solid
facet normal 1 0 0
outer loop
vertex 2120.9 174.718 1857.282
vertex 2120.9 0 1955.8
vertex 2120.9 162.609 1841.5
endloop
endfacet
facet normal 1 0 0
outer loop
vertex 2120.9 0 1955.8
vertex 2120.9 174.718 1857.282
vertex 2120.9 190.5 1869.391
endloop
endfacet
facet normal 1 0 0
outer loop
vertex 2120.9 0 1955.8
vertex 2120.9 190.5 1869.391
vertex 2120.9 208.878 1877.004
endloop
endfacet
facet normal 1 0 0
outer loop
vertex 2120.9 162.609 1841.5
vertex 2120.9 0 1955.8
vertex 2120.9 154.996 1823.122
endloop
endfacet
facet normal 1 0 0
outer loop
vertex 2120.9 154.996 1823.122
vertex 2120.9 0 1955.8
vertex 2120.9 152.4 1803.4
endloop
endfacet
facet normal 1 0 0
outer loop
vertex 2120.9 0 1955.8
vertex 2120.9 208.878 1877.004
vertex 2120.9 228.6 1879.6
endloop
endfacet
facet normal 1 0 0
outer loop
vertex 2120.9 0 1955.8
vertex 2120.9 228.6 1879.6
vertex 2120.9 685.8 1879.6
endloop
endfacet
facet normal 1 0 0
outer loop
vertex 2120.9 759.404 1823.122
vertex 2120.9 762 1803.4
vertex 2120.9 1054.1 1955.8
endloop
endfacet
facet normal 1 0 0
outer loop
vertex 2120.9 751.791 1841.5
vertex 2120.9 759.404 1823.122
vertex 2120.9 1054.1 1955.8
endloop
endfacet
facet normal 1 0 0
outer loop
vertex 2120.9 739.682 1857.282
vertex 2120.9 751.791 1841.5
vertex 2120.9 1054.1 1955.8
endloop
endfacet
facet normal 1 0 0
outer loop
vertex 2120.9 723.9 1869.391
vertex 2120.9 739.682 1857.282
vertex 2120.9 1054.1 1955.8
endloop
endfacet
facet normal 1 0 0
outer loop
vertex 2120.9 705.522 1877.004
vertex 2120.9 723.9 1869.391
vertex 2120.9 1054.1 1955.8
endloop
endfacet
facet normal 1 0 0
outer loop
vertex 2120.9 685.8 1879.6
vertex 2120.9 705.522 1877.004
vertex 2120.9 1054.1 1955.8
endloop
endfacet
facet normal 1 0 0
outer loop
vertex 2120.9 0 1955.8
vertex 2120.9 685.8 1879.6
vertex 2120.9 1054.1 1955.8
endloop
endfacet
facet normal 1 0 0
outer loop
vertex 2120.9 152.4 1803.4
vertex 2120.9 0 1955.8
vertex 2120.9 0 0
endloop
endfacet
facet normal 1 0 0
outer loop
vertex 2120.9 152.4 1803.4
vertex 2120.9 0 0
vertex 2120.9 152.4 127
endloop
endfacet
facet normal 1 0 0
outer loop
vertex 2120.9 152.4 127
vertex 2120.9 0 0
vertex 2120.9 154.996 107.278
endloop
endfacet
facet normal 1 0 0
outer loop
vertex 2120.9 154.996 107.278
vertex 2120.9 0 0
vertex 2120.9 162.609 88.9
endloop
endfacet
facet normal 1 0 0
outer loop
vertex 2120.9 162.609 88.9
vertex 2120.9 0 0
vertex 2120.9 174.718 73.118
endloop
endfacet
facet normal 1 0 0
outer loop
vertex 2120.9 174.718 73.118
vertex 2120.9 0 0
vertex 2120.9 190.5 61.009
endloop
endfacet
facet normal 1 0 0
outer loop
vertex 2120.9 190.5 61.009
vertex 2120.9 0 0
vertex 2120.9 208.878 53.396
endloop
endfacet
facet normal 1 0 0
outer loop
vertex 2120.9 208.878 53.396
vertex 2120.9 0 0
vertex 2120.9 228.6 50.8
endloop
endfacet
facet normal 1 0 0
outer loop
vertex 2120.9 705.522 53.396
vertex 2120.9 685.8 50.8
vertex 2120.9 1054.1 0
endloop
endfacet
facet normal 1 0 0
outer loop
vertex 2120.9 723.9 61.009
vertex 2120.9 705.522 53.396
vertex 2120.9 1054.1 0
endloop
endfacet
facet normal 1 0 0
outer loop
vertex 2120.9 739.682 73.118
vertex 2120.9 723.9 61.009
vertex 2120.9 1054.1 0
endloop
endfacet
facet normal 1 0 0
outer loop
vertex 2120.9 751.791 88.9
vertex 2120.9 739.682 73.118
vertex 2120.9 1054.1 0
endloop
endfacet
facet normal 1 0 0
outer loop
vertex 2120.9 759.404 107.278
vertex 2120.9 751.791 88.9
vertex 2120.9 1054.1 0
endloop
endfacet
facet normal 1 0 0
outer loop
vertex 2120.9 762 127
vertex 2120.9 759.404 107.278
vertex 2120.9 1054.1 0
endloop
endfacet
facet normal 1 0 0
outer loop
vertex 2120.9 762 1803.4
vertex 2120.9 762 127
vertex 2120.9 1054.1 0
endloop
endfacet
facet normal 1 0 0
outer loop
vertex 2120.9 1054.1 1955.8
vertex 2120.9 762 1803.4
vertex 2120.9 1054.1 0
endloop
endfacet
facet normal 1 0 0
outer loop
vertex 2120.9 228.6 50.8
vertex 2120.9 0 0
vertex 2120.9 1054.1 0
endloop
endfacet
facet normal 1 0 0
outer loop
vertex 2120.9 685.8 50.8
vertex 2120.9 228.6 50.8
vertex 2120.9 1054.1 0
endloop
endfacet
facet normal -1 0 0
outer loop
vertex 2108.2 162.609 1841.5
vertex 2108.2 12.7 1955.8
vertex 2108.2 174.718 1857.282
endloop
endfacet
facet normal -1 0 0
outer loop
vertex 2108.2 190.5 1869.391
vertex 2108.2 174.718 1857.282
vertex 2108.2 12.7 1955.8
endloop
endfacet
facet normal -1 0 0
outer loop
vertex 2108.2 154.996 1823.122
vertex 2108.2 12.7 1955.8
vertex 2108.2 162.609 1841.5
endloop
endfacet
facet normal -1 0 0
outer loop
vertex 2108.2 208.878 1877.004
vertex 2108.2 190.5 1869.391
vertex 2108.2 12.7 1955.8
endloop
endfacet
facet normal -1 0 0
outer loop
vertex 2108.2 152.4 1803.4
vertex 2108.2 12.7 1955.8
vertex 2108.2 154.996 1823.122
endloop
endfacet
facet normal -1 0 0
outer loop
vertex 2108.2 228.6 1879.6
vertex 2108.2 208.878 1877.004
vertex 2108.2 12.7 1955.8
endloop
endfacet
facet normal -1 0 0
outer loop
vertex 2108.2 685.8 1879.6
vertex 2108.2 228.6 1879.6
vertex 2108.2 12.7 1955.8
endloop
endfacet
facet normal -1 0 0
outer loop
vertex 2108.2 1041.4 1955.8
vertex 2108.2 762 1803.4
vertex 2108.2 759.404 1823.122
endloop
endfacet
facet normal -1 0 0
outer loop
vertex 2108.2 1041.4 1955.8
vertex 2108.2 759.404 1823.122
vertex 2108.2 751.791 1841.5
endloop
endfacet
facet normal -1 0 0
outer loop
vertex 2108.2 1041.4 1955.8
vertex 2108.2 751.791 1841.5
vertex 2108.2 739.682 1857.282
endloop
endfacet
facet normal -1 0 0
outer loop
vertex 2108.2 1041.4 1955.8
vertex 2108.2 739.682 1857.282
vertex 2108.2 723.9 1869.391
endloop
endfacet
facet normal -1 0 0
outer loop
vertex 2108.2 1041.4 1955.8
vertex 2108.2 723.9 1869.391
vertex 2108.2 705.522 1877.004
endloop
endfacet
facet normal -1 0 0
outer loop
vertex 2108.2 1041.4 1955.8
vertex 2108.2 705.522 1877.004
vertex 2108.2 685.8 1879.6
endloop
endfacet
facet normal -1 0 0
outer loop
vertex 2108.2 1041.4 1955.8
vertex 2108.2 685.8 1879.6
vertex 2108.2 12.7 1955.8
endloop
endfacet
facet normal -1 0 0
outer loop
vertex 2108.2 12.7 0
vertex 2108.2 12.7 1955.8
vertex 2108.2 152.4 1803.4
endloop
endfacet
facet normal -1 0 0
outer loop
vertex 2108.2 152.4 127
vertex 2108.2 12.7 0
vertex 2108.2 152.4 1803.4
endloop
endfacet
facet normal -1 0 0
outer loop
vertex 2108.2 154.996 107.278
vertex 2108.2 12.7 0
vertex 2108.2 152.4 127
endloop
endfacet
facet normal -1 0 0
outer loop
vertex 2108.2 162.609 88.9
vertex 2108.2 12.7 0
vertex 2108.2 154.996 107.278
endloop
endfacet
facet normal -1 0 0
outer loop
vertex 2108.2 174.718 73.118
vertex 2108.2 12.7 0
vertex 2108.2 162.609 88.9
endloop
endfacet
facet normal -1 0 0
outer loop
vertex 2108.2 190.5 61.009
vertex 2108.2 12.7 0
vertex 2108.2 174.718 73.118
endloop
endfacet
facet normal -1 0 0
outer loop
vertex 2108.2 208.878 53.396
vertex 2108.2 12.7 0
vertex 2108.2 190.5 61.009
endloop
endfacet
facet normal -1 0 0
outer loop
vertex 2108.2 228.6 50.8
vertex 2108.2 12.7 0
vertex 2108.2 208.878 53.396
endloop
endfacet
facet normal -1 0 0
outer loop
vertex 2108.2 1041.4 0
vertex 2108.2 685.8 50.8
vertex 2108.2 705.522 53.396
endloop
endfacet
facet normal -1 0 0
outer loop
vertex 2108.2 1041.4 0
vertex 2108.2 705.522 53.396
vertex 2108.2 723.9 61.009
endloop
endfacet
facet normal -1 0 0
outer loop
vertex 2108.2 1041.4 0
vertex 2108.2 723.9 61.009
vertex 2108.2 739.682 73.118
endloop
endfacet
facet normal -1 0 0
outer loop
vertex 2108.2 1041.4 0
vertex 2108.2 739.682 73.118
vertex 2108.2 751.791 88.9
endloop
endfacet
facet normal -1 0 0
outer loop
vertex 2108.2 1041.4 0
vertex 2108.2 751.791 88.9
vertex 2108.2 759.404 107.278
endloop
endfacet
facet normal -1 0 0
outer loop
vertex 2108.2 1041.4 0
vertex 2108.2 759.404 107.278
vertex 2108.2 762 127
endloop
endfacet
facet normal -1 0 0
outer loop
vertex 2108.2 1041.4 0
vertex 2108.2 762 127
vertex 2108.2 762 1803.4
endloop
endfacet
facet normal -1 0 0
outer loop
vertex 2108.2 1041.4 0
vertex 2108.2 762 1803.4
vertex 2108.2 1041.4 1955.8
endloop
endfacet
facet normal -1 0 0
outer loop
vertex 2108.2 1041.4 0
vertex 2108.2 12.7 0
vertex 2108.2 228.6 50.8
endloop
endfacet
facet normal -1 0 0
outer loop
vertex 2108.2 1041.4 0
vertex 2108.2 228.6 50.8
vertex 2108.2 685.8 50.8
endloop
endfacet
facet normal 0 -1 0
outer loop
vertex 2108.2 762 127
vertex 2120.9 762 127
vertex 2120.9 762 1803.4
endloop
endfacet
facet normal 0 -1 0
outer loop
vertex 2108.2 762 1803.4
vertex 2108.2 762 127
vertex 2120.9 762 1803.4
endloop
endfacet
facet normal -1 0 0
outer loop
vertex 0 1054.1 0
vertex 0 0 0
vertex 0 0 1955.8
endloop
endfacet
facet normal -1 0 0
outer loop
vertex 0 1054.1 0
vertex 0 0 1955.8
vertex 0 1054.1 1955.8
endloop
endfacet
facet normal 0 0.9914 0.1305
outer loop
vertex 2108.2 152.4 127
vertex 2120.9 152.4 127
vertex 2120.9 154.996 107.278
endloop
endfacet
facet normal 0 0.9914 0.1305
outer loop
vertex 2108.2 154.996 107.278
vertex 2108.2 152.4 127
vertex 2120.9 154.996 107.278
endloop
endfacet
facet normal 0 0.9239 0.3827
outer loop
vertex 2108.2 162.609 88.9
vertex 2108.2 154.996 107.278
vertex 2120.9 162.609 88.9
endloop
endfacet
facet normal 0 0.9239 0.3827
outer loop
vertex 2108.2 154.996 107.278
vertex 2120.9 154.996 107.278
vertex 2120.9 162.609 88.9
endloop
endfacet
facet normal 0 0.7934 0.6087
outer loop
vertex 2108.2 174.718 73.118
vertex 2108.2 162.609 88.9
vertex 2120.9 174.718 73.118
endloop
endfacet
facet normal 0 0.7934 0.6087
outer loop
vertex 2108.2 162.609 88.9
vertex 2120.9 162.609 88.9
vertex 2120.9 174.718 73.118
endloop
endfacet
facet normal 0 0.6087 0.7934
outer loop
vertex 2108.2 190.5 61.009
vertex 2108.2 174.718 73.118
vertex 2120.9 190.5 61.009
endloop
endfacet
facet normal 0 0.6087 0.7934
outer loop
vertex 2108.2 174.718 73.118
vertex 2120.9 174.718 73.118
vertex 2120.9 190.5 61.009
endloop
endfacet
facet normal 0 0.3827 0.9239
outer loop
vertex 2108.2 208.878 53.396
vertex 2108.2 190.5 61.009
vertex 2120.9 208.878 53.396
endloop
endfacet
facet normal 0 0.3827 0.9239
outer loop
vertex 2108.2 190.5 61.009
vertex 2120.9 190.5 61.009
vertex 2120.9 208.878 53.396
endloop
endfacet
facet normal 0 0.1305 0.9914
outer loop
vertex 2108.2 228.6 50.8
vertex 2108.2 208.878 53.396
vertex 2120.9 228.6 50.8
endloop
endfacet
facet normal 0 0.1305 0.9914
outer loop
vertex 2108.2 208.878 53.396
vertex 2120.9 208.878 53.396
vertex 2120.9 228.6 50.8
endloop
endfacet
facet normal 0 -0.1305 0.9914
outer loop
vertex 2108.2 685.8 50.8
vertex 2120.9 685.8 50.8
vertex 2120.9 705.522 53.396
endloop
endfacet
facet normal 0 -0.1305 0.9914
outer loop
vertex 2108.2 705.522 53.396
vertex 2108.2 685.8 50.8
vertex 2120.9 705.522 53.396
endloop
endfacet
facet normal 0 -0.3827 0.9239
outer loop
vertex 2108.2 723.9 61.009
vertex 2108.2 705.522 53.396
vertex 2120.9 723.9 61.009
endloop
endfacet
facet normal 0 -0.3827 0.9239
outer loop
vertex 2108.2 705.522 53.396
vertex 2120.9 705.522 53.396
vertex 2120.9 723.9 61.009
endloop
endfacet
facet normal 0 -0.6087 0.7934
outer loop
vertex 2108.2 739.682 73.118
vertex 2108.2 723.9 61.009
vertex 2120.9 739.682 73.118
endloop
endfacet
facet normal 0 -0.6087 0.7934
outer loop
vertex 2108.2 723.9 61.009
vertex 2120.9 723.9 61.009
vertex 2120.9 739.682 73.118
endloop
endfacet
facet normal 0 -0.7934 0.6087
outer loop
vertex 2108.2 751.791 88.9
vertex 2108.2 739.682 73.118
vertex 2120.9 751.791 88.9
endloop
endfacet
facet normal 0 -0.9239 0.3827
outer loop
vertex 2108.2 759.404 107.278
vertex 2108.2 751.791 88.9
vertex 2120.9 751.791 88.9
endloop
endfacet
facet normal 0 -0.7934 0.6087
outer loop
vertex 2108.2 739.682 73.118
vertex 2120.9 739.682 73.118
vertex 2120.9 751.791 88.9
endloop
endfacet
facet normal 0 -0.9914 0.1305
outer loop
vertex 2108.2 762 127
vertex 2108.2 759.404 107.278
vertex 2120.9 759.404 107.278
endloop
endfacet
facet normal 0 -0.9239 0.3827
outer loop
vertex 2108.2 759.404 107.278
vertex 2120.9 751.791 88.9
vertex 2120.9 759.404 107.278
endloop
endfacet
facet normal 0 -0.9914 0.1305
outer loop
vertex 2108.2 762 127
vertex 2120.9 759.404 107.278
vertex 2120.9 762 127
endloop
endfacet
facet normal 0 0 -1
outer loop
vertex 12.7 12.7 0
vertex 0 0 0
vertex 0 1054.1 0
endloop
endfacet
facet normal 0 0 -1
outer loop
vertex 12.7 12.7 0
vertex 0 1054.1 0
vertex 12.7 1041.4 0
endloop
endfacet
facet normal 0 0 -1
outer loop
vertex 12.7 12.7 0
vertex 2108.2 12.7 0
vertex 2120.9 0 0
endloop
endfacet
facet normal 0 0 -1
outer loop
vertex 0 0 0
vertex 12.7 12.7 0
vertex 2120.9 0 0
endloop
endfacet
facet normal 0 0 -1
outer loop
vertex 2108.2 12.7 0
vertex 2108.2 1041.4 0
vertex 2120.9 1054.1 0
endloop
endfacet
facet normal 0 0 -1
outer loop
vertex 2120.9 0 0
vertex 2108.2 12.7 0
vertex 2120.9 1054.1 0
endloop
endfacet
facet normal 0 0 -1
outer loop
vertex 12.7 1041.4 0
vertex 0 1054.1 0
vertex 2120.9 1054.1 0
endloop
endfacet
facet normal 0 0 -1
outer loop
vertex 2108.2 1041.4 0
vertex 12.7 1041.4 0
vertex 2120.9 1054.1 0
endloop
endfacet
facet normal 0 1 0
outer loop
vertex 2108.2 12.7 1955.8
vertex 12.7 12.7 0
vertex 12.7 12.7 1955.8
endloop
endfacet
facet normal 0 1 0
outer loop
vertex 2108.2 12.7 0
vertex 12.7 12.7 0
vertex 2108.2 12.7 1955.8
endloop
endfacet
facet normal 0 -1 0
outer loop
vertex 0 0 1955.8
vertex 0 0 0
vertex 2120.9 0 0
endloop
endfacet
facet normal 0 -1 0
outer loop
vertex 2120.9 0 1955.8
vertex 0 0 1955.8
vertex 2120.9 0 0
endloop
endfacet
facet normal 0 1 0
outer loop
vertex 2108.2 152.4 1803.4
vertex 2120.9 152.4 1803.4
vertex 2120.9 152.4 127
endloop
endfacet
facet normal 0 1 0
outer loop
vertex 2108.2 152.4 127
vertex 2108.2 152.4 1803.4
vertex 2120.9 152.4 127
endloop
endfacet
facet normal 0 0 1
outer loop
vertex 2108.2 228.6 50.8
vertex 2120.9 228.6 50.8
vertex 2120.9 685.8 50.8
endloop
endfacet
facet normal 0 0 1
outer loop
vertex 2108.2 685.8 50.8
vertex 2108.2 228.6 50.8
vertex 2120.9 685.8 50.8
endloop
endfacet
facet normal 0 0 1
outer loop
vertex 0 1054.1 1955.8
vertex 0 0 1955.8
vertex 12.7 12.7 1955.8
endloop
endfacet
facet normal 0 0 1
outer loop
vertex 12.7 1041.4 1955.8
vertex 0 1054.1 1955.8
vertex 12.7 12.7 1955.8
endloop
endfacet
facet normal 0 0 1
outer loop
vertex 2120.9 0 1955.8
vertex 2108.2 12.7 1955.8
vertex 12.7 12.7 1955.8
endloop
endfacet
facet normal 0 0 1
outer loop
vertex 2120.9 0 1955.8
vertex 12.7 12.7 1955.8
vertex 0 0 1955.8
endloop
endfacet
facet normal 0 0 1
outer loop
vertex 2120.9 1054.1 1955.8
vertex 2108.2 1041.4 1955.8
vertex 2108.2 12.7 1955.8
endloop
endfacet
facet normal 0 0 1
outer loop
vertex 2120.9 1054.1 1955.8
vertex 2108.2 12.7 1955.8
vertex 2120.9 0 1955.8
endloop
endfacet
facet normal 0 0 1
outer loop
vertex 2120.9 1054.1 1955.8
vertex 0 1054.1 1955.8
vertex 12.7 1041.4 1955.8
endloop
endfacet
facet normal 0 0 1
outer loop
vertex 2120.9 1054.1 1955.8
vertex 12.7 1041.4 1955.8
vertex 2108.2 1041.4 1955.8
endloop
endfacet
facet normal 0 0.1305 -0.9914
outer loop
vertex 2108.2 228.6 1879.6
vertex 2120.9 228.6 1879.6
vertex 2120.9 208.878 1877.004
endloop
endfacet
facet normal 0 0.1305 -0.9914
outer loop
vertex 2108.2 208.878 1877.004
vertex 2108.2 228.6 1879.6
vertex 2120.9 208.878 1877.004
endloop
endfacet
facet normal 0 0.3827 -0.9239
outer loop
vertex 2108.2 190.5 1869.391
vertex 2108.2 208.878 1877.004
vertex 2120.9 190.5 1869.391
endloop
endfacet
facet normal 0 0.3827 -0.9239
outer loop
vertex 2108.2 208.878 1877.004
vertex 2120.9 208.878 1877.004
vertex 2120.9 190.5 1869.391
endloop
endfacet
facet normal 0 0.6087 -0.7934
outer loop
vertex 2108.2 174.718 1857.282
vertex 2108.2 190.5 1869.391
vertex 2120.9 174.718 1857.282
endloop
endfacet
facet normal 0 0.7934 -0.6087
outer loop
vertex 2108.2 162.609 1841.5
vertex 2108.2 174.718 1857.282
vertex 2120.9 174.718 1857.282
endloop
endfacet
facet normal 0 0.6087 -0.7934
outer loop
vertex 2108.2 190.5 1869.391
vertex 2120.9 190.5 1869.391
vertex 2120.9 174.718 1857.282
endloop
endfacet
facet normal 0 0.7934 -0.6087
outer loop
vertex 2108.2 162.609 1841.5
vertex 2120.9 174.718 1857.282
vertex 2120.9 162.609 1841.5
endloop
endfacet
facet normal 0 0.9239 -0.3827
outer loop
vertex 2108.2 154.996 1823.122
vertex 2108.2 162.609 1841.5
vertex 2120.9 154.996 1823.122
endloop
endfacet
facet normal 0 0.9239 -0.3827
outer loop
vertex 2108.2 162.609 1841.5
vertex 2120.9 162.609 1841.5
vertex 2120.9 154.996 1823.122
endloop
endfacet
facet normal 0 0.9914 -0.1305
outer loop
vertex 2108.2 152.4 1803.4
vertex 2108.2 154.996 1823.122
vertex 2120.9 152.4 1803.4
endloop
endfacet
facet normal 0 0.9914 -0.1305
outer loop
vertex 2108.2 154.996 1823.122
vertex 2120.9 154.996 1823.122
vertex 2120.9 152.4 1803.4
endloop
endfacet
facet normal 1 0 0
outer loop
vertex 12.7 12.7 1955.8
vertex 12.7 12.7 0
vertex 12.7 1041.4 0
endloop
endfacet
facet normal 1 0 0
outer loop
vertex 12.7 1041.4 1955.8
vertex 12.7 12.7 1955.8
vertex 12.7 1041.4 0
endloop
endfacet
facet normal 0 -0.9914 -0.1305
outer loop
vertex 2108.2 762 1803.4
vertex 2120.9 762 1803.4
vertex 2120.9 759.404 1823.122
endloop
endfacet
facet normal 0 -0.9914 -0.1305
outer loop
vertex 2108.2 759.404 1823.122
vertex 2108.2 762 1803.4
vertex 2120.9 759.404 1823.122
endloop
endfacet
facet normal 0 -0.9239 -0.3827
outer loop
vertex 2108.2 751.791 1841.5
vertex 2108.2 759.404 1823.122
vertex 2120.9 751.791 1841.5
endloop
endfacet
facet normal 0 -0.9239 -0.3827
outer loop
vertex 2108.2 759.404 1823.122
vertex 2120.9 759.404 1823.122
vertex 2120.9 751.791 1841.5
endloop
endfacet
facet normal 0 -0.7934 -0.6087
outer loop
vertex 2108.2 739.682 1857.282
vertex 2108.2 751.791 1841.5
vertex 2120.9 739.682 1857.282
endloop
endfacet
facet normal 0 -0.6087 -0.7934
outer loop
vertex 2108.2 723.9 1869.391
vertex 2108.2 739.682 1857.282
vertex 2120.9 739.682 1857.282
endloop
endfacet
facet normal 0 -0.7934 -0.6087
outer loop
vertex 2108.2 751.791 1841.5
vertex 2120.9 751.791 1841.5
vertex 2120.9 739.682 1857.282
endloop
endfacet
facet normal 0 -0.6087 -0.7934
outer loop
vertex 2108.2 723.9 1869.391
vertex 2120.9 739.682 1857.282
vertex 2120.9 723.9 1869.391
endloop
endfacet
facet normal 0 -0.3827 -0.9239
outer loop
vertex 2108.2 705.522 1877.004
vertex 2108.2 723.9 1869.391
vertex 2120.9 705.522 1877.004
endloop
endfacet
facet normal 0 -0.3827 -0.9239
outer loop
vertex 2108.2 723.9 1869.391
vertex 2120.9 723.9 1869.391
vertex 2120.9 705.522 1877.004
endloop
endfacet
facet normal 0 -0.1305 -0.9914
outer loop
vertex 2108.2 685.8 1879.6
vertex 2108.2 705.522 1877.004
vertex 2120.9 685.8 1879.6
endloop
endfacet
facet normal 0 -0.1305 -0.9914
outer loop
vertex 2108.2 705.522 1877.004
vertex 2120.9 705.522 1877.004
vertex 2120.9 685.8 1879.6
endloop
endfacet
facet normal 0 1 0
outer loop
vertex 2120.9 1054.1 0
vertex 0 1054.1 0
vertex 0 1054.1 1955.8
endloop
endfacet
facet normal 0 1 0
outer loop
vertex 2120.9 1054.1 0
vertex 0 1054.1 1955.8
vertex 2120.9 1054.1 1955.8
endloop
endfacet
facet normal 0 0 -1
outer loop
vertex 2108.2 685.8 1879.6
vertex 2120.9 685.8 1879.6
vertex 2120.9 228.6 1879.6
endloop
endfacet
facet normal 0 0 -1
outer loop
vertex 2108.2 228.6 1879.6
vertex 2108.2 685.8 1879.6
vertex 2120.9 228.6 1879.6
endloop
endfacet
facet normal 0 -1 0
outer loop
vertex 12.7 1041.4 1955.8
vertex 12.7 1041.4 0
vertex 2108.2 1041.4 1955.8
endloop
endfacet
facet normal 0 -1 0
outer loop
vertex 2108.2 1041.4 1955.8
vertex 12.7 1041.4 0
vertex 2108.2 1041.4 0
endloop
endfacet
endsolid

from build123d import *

# Parameters (mm, degrees)
F0_W     = 2120.9
F0_H     = 1054.1
F0_W_2   = 2095.5
F0_H_2   = 1028.7
F1_DEPTH = 1955.8
F3_DEPTH = 12.7


with BuildPart() as f1:
    # F0 (on Top) → F1 (new body)
    with BuildSketch(Plane.XY):
        with Locations((1060.45, 527.05)):
            Rectangle(F0_W, F0_H)
        with Locations((1060.45, 527.05)):
            Rectangle(F0_W_2, F0_H_2, mode=Mode.SUBTRACT)
    extrude(amount=F1_DEPTH)

    # F2 (on face) → F3 (cut, through all)
    with BuildSketch(Plane.YZ.offset(2120.9)):
        with BuildLine():
            ThreePointArc((152.4, 127), (174.718463, 73.118463), (228.6, 50.8))
            Line((228.6, 50.8), (685.8, 50.8))
            ThreePointArc((685.8, 50.8), (739.681537, 73.118463), (762, 127))
            Line((762, 127), (762, 1803.4))
            ThreePointArc((762, 1803.4), (739.681537, 1857.281537), (685.8, 1879.6))
            Line((685.8, 1879.6), (228.6, 1879.6))
            ThreePointArc((228.6, 1879.6), (174.718463, 1857.281537), (152.4, 1803.4))
            Line((152.4, 1803.4), (152.4, 127))
        make_face()
    extrude(amount=-F3_DEPTH, mode=Mode.SUBTRACT)


solid = f1.part
